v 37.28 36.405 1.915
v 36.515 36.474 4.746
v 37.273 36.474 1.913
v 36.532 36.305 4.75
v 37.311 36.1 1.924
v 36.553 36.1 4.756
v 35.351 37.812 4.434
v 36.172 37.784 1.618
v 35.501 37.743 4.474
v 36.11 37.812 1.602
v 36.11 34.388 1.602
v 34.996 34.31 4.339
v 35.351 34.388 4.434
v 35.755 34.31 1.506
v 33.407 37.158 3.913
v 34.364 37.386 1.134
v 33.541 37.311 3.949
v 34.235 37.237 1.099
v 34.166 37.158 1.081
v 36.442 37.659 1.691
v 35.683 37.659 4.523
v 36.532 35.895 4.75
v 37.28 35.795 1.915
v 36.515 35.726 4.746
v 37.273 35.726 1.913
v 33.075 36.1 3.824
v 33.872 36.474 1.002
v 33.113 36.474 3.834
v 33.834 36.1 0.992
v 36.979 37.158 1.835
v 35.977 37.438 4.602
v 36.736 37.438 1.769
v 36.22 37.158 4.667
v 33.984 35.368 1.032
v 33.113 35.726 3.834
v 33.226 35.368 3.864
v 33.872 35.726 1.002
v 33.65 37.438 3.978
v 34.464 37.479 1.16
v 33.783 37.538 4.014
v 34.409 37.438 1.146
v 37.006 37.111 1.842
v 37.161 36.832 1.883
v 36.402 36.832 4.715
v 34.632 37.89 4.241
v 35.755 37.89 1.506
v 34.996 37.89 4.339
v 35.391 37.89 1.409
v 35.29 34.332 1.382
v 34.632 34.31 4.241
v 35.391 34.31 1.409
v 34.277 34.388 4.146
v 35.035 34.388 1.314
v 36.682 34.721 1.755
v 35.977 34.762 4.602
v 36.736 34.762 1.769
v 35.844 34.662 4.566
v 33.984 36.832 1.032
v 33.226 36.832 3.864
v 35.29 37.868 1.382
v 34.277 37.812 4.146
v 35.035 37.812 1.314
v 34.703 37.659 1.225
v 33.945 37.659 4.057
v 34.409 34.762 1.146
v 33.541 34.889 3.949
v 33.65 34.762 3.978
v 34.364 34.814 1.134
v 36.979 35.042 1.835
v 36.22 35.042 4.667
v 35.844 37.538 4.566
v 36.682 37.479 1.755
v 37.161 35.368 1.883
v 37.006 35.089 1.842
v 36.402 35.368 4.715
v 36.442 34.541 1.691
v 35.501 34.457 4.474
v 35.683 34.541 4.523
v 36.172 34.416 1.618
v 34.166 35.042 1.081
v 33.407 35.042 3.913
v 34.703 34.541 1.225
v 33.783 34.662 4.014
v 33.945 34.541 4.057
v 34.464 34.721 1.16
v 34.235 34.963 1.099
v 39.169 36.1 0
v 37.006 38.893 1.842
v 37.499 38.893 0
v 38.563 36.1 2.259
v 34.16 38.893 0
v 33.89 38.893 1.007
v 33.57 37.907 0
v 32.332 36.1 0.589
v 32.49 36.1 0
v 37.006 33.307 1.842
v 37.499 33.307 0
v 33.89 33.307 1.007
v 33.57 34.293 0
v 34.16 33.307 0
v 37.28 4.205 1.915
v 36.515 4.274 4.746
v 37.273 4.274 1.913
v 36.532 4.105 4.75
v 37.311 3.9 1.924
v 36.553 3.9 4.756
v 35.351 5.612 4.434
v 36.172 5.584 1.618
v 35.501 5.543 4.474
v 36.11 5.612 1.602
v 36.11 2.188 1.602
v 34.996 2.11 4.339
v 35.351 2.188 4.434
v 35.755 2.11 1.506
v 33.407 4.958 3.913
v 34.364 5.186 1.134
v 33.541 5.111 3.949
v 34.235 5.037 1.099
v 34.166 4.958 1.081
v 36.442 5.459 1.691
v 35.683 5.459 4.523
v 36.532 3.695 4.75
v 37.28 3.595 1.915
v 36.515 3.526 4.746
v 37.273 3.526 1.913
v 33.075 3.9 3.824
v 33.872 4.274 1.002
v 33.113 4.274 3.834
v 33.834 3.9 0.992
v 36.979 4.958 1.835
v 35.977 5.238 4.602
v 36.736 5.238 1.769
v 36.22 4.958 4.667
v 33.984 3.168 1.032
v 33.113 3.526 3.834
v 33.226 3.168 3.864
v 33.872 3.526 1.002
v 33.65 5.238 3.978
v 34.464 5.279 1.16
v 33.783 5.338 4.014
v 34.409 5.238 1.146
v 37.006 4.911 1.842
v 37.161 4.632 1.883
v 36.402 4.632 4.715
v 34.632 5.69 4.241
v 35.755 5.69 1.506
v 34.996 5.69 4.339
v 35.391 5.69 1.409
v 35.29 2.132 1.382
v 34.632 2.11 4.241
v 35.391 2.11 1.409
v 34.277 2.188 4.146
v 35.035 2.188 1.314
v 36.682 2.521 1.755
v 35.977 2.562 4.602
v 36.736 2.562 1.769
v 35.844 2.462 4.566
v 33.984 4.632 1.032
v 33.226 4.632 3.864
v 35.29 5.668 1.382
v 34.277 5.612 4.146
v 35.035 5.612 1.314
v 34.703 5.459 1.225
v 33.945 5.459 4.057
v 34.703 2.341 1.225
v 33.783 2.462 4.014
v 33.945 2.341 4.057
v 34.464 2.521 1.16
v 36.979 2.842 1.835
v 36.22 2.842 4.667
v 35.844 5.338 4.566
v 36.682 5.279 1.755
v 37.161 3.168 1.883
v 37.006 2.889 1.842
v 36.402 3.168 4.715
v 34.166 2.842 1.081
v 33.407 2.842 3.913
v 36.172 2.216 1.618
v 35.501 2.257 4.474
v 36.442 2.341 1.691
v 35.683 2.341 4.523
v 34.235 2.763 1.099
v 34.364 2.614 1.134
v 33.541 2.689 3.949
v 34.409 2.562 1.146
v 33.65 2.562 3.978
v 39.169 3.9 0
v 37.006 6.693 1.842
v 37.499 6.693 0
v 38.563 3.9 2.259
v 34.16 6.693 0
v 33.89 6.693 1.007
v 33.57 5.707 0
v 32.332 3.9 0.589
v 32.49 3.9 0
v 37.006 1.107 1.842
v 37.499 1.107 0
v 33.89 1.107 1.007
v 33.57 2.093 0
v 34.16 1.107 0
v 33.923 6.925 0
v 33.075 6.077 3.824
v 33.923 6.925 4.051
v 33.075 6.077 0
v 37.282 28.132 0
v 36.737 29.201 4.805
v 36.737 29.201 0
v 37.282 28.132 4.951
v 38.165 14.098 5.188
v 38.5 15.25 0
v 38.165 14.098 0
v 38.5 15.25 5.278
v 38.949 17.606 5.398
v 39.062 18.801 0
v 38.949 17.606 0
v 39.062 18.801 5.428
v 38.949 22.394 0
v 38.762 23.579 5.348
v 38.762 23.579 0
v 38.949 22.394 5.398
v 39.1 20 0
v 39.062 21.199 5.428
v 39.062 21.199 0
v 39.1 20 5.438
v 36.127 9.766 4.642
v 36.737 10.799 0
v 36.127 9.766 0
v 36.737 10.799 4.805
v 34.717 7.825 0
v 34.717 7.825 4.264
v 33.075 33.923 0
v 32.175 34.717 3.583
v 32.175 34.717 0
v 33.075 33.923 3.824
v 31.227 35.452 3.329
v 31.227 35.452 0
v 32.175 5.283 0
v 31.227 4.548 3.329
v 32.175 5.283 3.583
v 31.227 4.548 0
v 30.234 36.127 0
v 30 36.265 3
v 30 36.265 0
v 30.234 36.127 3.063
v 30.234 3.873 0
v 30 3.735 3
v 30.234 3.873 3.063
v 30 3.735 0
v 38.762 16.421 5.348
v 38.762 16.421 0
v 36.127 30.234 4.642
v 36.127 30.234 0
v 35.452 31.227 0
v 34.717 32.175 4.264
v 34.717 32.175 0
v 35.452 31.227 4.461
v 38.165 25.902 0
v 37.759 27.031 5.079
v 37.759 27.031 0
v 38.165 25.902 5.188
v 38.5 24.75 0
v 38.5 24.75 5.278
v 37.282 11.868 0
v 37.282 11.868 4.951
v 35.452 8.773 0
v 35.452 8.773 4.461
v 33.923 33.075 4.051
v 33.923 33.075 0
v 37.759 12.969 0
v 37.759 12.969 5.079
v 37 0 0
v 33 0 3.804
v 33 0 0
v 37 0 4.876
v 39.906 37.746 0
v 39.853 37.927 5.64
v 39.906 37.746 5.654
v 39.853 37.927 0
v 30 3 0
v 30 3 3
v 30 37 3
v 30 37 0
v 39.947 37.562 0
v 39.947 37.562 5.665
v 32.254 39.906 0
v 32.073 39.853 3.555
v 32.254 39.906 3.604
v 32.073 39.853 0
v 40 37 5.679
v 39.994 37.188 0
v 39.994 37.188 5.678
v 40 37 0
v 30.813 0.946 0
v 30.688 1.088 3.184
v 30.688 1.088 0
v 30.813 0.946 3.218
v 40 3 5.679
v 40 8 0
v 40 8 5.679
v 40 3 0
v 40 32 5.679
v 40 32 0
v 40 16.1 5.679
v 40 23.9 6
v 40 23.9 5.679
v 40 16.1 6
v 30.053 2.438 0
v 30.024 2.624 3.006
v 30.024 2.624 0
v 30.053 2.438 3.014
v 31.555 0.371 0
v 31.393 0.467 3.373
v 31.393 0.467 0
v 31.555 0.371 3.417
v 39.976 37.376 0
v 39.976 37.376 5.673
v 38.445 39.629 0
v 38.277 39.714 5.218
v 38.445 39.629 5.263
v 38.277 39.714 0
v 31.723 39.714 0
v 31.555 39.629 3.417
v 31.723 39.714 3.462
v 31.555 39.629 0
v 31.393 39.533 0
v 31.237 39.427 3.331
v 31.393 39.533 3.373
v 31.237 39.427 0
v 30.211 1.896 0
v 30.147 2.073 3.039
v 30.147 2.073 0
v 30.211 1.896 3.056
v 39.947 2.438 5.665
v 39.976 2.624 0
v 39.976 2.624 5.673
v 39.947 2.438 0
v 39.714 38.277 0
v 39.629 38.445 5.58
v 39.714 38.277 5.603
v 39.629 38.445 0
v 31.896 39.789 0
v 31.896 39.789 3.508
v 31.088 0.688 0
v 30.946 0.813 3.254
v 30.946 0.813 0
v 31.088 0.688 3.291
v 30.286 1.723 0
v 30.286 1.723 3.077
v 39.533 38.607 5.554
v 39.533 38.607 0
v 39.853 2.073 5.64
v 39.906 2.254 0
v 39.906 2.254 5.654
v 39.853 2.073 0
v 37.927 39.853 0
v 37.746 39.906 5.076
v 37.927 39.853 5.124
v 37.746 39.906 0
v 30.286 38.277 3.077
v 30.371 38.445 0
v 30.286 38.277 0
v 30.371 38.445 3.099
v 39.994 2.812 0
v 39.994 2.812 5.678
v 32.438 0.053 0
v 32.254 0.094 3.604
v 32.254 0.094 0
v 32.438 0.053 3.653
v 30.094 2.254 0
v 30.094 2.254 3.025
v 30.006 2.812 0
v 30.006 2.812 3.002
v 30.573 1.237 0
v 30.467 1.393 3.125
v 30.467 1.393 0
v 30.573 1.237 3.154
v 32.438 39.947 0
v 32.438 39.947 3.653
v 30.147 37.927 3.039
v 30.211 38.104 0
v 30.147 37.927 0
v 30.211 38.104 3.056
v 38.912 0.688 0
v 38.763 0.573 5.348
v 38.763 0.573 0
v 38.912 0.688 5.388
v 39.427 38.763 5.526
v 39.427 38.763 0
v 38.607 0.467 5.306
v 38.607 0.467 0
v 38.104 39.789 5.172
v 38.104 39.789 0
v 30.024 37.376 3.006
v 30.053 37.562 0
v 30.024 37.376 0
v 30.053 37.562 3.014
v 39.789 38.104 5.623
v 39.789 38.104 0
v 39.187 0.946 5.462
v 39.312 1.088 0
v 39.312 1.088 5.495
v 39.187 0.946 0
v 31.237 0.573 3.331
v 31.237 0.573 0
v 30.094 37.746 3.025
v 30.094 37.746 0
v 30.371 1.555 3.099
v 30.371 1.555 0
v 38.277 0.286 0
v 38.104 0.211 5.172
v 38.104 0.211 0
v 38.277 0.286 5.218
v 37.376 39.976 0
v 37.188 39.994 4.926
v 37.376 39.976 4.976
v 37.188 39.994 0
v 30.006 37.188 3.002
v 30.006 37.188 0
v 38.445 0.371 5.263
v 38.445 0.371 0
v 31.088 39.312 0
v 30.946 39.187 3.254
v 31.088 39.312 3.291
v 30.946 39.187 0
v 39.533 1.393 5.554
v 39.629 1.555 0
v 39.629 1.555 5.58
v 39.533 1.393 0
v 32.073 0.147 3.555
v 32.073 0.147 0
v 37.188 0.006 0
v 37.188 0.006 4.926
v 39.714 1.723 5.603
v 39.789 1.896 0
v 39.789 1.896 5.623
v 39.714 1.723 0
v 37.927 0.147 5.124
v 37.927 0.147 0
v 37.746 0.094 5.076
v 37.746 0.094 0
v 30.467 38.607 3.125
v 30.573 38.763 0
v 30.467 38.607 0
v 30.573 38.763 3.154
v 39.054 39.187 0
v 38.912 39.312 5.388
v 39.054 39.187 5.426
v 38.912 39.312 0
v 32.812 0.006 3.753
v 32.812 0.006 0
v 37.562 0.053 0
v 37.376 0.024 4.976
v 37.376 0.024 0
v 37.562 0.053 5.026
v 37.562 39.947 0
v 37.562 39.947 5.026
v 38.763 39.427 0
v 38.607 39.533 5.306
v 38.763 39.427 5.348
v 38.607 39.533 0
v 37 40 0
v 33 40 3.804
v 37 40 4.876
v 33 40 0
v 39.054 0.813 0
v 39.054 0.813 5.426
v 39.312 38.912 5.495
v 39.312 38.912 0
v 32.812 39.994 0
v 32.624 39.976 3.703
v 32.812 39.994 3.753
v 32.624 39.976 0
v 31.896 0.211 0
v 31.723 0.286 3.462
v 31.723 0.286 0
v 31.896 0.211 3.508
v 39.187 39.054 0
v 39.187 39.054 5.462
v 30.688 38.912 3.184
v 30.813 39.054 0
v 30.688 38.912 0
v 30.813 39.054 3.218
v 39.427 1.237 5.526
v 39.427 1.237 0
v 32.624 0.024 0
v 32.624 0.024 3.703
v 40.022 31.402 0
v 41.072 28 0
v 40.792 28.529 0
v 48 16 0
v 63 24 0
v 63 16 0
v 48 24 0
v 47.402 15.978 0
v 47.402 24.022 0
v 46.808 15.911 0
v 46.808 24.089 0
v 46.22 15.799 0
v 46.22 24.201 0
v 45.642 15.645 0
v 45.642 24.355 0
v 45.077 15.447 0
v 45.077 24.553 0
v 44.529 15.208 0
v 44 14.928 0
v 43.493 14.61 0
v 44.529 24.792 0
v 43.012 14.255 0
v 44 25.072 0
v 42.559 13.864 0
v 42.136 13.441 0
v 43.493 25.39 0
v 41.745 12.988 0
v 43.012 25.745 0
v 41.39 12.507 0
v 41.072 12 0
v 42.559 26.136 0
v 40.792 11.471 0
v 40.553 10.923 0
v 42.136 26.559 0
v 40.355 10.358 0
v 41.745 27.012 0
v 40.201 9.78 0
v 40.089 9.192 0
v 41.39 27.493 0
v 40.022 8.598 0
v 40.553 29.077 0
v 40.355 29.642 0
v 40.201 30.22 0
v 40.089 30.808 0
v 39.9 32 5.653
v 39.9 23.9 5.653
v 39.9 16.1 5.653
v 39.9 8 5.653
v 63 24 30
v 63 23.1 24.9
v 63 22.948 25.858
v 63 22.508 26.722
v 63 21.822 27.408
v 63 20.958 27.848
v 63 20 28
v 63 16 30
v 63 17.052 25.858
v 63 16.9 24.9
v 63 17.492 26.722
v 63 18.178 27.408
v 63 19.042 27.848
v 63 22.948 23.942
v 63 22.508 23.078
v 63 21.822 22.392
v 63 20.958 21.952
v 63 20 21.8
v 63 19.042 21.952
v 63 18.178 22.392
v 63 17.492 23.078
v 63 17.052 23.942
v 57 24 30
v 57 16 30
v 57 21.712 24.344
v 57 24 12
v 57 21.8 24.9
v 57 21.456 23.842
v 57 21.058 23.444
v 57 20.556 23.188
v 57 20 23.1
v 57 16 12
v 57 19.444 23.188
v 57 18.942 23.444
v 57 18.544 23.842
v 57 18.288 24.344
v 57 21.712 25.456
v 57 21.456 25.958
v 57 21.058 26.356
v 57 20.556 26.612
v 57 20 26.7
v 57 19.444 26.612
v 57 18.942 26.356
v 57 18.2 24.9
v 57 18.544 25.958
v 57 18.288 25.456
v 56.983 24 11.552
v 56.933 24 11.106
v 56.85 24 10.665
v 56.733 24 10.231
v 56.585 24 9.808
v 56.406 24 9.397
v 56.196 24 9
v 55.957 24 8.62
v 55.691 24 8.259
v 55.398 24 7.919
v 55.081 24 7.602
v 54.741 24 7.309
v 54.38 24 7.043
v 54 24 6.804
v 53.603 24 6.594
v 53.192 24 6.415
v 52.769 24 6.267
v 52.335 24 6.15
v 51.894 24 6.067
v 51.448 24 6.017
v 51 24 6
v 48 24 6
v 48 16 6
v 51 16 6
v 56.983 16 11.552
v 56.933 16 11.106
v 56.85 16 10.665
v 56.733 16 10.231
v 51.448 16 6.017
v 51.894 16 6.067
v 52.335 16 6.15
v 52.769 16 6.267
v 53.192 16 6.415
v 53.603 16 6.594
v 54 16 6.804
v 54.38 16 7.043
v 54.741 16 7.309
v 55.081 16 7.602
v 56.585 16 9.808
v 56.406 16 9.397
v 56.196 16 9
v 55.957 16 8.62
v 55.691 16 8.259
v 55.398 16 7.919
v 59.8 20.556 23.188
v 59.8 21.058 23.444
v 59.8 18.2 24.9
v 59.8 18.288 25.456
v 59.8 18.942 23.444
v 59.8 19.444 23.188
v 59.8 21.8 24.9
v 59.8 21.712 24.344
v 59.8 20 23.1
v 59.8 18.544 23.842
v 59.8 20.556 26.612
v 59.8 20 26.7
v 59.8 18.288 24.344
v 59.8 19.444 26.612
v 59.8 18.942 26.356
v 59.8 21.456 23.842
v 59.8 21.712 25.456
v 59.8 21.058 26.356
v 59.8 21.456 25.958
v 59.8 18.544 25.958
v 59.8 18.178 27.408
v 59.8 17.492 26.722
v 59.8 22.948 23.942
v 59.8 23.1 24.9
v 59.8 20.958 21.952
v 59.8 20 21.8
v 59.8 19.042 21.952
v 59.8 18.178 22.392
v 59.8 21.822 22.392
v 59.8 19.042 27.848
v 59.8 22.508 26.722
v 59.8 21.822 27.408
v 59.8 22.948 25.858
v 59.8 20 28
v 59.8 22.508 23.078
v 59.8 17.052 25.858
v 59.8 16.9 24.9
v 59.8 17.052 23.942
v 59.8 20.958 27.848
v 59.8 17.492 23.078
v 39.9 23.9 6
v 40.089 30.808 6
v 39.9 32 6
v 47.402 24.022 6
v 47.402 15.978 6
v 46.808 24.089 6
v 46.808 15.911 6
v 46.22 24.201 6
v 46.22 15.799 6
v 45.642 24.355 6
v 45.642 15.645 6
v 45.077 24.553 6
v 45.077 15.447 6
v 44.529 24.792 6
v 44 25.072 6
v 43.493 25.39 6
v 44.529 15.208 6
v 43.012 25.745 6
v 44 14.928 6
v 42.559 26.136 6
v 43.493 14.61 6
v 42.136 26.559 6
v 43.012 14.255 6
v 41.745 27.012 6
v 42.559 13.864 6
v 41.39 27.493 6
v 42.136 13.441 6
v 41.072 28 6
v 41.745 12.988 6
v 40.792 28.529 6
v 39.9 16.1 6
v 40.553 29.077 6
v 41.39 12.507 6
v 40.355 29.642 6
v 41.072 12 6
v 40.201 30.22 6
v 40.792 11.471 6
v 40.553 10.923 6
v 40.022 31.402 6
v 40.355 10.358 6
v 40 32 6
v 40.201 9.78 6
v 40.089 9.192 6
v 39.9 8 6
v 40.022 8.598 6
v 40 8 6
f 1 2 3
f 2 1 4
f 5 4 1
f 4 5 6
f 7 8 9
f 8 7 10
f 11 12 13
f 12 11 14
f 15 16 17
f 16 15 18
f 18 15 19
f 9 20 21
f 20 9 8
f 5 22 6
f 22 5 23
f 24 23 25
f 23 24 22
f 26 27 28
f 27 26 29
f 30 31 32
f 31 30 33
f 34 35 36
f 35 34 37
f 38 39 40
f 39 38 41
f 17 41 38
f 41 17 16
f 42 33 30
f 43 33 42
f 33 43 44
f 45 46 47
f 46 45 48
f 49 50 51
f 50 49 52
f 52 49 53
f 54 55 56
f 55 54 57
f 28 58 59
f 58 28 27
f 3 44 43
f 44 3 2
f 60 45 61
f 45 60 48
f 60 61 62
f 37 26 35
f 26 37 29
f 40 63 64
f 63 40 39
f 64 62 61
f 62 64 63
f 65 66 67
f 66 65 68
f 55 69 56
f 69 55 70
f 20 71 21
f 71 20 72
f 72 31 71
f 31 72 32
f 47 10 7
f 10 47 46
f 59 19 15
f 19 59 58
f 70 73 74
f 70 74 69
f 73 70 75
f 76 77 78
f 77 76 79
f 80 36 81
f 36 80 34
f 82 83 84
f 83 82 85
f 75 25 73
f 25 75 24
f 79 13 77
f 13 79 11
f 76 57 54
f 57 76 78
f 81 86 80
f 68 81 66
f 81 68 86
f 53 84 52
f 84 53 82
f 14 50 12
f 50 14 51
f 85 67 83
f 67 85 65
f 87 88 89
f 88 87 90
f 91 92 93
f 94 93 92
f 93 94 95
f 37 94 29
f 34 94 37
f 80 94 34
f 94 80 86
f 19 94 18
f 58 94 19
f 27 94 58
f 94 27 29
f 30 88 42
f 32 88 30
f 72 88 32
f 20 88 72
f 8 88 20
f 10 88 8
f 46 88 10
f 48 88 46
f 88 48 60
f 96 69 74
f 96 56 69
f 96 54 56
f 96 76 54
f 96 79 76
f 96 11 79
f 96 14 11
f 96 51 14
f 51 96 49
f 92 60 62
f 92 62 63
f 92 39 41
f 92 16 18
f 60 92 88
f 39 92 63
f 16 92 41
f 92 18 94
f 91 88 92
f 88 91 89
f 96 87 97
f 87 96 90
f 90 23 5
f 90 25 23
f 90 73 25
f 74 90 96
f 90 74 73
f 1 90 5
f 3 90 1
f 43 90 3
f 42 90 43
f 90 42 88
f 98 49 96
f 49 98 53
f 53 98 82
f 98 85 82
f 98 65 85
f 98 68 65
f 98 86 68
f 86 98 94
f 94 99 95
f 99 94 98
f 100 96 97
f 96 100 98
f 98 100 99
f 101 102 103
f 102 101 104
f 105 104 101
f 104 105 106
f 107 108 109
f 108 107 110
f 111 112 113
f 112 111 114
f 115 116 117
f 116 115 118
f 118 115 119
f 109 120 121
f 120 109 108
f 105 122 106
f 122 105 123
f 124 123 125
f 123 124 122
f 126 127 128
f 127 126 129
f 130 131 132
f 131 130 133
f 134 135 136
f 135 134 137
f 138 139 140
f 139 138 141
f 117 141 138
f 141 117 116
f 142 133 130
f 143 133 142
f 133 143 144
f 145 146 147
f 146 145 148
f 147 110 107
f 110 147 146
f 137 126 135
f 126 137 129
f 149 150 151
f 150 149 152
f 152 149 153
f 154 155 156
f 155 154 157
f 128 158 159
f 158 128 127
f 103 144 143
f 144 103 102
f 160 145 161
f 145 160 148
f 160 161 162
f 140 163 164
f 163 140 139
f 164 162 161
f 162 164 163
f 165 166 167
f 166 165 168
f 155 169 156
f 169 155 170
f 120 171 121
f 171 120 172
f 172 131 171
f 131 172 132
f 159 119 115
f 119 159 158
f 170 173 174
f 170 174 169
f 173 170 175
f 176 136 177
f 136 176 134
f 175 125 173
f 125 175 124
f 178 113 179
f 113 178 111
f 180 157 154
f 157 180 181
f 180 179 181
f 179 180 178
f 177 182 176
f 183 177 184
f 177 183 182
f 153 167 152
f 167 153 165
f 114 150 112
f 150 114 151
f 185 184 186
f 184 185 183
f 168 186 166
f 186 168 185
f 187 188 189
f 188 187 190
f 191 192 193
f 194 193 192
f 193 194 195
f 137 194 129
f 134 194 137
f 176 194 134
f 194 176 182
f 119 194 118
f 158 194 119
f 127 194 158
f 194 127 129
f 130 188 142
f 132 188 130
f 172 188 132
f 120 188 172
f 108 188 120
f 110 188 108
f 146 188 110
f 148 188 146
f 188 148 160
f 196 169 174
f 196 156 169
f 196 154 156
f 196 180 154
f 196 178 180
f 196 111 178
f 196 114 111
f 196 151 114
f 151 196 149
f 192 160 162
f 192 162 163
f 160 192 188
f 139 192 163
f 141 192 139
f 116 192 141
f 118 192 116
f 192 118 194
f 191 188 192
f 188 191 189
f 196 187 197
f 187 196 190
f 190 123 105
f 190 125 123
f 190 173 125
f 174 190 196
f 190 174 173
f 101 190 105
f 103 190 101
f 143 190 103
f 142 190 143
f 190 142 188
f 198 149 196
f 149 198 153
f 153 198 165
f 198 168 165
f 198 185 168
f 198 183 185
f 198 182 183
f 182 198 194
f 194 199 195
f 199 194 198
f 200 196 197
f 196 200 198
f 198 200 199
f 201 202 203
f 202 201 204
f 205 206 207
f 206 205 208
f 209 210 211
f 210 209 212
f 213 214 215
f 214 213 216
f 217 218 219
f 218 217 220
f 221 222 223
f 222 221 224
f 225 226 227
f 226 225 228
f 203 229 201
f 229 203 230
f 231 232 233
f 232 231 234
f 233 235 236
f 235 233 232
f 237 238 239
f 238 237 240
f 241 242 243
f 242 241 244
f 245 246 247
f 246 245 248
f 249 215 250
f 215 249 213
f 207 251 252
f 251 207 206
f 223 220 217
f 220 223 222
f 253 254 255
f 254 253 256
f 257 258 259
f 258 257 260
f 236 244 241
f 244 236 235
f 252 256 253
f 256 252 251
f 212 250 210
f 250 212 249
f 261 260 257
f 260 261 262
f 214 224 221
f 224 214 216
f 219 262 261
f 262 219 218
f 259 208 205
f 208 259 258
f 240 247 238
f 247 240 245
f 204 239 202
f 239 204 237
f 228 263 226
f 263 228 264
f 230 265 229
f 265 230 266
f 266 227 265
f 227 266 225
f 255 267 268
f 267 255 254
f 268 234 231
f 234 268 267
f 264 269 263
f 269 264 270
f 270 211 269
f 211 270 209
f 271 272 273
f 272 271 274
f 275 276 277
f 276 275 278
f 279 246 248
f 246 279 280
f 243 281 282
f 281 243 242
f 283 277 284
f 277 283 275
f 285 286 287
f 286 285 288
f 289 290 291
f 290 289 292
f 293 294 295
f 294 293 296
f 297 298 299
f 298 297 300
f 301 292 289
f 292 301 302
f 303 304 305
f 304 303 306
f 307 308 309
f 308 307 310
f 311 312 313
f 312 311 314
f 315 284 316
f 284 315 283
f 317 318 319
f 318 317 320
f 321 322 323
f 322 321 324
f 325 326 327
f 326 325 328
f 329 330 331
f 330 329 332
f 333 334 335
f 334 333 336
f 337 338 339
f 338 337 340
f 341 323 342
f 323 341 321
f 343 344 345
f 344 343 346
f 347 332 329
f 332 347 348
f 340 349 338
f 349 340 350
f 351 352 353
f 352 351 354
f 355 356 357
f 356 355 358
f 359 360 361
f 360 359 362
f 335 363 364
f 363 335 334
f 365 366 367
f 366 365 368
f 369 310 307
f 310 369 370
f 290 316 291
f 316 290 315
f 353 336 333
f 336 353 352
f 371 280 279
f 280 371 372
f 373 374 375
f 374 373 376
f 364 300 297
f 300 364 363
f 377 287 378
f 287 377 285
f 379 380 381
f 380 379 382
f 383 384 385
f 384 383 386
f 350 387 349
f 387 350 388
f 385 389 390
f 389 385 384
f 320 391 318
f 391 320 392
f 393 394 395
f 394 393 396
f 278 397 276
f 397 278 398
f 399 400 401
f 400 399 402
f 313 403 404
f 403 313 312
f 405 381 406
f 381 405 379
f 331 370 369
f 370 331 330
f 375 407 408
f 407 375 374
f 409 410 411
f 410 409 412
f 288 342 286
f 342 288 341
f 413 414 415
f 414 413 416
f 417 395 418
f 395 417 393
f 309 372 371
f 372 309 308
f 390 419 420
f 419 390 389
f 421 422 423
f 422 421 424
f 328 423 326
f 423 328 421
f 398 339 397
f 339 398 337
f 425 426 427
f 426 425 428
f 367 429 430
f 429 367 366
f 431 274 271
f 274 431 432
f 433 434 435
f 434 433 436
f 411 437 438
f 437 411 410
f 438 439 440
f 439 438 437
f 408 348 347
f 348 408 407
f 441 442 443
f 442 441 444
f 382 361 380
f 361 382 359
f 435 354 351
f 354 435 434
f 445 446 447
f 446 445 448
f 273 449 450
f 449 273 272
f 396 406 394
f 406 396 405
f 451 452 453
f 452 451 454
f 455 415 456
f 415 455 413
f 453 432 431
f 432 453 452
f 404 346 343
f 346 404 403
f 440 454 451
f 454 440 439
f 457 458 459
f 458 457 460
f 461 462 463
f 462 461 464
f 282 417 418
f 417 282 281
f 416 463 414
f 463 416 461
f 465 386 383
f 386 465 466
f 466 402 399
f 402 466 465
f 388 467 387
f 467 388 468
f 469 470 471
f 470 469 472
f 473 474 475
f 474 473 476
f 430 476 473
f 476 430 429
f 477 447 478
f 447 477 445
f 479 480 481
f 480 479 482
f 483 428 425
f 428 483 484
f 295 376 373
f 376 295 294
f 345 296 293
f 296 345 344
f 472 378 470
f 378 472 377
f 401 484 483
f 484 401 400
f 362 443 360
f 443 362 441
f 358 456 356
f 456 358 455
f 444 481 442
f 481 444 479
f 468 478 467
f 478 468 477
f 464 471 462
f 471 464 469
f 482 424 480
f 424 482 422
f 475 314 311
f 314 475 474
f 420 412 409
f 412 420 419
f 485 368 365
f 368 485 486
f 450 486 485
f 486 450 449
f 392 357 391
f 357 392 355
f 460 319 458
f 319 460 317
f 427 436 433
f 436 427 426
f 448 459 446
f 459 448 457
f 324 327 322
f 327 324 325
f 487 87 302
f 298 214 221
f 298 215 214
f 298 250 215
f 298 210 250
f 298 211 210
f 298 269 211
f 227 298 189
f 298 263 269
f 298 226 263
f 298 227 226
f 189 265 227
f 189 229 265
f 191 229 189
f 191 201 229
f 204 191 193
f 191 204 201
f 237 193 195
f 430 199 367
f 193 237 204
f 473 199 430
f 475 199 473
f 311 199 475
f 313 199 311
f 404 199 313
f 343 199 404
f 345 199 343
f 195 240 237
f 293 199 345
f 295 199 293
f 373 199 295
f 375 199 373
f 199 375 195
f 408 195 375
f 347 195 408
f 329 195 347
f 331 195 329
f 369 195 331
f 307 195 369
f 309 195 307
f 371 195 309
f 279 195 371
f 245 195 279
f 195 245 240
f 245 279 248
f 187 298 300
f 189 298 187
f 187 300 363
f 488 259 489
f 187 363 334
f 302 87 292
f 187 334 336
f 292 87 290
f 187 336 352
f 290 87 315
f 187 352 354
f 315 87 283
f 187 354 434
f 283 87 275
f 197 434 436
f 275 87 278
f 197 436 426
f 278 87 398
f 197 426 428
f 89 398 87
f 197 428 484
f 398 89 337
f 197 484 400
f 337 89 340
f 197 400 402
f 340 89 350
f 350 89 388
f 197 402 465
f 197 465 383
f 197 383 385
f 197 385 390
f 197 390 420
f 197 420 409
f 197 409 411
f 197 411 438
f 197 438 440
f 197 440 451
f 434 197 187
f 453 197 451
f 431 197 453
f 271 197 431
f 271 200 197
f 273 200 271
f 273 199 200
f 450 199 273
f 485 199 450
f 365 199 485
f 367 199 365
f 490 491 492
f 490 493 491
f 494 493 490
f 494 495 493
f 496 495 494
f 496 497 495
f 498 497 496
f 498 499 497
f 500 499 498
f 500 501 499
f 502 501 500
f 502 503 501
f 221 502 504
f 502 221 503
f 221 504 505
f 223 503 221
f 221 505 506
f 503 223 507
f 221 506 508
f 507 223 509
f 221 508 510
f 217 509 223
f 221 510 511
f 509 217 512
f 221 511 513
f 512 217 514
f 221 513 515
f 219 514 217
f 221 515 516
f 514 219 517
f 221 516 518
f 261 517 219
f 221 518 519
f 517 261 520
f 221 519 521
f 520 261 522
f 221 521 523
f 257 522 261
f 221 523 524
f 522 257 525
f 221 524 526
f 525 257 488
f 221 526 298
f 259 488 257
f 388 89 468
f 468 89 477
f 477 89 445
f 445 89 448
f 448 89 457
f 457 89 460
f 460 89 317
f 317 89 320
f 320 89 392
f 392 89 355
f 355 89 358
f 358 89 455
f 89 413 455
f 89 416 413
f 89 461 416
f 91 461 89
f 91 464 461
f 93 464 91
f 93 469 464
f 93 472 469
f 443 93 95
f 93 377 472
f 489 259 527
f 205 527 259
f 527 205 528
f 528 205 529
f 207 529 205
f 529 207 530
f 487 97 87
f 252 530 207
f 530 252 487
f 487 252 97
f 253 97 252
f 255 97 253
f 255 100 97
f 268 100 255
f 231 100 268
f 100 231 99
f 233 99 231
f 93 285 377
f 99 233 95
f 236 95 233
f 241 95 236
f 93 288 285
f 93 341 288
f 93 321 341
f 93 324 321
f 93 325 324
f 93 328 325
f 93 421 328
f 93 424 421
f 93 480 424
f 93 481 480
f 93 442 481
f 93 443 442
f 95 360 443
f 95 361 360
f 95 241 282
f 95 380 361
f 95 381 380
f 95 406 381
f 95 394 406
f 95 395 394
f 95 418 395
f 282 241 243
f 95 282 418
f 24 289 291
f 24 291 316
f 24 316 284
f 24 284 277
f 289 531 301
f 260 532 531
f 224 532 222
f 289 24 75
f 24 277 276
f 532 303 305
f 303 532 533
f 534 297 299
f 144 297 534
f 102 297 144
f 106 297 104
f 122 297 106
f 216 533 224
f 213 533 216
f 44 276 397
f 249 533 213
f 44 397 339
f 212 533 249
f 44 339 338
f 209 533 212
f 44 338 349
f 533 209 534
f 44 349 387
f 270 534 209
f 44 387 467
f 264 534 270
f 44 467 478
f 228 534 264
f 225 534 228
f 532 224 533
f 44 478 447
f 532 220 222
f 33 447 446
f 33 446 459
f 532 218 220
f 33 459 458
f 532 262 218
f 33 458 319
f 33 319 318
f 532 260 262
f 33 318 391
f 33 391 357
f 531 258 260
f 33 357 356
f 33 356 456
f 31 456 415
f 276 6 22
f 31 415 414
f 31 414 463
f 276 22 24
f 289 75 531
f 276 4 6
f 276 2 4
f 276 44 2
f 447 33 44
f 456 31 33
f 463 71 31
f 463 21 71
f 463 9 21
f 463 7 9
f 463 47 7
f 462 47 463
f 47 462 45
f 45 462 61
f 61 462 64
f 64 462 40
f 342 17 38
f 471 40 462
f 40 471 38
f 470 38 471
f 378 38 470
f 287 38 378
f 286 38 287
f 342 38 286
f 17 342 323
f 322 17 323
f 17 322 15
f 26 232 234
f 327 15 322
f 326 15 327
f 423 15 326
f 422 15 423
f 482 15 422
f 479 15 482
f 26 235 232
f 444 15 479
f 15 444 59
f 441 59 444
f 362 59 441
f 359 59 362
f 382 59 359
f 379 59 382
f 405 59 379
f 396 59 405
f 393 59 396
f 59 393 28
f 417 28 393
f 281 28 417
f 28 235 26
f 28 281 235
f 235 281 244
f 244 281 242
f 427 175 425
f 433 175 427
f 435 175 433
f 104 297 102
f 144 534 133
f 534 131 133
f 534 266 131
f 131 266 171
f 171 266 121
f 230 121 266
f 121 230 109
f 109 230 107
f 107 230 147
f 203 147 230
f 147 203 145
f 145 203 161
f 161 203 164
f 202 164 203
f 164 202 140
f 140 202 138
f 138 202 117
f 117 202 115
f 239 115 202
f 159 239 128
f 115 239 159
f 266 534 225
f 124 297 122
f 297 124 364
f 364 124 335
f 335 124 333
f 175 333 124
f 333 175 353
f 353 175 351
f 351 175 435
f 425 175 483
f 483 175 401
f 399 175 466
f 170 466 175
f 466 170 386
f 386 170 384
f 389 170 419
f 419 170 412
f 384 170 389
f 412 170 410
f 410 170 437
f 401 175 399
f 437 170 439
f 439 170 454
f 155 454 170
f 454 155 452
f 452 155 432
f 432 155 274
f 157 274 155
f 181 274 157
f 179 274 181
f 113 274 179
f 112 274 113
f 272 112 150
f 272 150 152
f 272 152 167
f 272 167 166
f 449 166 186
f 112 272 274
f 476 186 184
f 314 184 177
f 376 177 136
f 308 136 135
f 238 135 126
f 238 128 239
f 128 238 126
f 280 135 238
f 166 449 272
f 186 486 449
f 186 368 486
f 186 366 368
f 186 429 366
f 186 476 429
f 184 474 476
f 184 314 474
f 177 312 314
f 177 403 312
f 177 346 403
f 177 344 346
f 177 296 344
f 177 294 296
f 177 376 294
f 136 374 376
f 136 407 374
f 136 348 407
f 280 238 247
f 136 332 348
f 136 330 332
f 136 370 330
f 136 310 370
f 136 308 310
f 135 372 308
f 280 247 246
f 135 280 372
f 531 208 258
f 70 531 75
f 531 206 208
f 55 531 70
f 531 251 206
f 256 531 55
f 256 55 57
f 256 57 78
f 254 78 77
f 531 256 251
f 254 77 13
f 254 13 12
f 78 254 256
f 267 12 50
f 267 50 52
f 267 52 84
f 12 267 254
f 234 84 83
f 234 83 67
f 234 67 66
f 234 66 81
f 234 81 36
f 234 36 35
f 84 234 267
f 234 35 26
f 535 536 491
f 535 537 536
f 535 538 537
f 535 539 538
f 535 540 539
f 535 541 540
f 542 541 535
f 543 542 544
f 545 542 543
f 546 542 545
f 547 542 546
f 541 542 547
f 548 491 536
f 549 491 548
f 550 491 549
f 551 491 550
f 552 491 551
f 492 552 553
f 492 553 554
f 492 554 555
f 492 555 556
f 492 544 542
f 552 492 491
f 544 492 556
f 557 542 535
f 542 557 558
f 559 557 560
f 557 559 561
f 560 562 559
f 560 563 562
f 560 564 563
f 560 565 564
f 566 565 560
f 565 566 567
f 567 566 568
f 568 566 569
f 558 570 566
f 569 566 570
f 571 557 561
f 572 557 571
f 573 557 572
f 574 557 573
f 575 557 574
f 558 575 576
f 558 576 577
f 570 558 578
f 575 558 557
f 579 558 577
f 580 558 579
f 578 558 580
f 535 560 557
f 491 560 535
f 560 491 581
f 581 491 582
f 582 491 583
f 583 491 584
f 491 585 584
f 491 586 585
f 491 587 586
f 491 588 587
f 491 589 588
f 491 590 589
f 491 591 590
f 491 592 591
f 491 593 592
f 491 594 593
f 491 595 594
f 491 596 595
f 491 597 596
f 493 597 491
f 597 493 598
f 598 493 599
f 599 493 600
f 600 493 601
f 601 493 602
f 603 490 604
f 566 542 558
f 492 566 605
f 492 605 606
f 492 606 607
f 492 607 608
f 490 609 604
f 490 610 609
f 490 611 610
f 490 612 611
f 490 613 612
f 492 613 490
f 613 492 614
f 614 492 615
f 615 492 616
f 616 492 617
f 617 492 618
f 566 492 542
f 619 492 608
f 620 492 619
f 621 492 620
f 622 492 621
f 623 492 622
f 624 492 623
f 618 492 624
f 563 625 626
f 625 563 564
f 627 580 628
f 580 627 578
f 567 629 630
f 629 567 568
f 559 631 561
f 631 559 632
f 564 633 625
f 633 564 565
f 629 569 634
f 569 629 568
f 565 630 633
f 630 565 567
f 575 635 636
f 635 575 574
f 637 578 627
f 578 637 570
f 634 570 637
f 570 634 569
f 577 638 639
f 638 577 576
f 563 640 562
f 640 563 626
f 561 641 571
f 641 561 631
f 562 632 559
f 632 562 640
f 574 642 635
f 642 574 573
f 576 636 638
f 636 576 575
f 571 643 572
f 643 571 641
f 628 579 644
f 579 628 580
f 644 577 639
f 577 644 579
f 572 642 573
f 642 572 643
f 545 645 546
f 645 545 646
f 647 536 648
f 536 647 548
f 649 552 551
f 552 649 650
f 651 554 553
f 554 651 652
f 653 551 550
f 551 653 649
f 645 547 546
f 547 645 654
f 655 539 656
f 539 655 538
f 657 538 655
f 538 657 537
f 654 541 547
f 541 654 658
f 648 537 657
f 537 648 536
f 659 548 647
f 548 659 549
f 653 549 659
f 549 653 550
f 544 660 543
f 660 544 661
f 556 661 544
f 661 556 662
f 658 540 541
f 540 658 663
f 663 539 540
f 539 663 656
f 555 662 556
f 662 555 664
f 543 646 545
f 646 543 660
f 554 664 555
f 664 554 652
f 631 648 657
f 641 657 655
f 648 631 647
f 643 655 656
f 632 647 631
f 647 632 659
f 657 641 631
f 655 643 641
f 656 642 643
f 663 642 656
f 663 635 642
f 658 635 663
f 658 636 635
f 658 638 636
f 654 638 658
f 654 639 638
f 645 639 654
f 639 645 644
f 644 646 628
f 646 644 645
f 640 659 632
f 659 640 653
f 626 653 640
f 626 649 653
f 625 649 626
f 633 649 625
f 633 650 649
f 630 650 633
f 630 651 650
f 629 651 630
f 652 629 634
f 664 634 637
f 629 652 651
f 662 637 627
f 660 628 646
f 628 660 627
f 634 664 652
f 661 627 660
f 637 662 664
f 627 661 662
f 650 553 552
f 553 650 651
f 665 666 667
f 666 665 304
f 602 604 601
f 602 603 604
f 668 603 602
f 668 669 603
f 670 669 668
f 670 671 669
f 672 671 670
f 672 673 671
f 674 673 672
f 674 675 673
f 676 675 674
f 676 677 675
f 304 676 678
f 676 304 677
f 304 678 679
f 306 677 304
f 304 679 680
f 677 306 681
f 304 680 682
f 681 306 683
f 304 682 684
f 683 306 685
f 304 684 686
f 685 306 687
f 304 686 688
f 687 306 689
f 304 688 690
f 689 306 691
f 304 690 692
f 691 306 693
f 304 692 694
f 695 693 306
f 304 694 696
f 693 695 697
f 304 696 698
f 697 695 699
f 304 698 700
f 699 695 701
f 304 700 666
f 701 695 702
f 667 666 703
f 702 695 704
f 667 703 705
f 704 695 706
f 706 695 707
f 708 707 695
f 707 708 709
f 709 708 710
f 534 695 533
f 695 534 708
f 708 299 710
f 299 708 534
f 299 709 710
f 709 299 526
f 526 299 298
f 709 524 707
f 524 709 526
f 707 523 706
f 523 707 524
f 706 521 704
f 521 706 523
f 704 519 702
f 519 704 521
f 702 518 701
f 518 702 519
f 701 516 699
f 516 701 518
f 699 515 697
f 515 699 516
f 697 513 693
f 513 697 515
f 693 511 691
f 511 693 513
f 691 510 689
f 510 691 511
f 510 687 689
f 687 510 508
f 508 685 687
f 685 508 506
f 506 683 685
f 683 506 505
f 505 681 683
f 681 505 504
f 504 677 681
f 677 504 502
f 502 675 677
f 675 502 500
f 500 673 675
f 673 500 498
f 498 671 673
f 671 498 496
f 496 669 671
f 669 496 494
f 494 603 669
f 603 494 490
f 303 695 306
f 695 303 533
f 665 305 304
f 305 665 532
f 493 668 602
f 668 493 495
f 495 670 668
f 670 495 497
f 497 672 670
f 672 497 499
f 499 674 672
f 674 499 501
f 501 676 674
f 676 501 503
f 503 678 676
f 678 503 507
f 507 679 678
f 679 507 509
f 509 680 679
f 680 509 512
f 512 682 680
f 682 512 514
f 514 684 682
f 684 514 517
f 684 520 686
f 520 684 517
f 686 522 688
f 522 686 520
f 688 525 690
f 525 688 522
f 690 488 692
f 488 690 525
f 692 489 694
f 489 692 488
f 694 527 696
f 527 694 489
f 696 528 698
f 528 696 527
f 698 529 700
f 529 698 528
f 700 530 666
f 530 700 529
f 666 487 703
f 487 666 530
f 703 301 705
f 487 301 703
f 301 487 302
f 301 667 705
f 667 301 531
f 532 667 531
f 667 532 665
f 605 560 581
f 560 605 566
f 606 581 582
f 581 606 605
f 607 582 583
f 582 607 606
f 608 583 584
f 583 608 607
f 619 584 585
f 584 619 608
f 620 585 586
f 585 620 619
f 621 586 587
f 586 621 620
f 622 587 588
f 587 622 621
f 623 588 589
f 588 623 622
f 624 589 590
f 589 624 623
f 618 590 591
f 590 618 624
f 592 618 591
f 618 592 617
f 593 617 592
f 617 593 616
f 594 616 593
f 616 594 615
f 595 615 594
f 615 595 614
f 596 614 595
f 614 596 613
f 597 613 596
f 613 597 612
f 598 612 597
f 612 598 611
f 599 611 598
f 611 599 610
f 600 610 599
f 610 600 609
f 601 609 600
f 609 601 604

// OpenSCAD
// file: chamfers.scad
/* chamfers for openscad
 *
 *
 * (c) alj_rprp 2013 license GPL2.1
 */

// interface :
// chamfer				(len,r,rs)           : rounding of edge along z
// cylinder_chamfer	(majr,r,rs)				: circular rounding 
// rnd_wedge 			(len,lr,angle,r,rs)  : wedge with 1 rounded angle
// circular_rnd_wedge(majr,lr,angle,r,rs) : circular wedge/ 1 rounded angle

// len	: length of extrusion
// r		: rounding radius
// majr	: major radius of circular extrusion
// lr		: dist from left side of rounding center
// angle	: angle of wedge
// rs		: resolution - number of lines in the rounding
//
// use rs =0 for straight line chamfer in both chamfers
// wedges will look funny with rs < 5 or 6


$fn=64; 

//example=true;
example=false;

if(example==true) {
	chamfer(1,1,rs=8);
	translate([0,0,-1.5]) cylinder_chamfer(2.4,1,rs=2);
	translate([4,0,0]) rnd_wedge (1,1,30.0,0.3,rs=10);
	translate([4,0,-1.5]) 
		circular_rnd_wedge (0.5,0.5,30.0,0.3,rs=10);
}


module cylinder_chamfer(majr,r,rs=4)
{
	t=majr-r;
	p=r+0.1;
	rotate_extrude()	difference(){
		translate([t,0])square([p,p]);
		translate([t,0])circle(r,$fn=(rs+1)*4);
	}
}

module chamfer(len,r,rs=4)
{
	p=r+0.1;
	linear_extrude(height=len) difference()
	{
		square([p,p]);
		circle(r,$fn=(rs+1)*4);
	}
}

/*
 * lr = position centre rayon
 *	x1 = x component hypothenuse normal
 * x2 = x component up to point
 *
 * x1 = rr*sin(a)
 * x2 = y2/tan(a)
 *	y2 = rr*cos(a)+rr  
 *
 * base = lr + x1 + x2
 * base = lr + rr*( sin(a)+(cos(a)+1)/tan(a) 
*/
module rnd_wedge (len,lr,angle,r,rs=6) {
	rr=r*(sin(angle)+(cos(angle)+1)/tan(angle));
	ratio=(lr+rr)/lr;
	base=lr*ratio;
	b=base*tan(angle);
	h=base/cos(angle);

	linear_extrude(height=len)union(){
		polygon([[0,0],[lr,0],[lr+r*sin(angle),r*(1+cos(angle))],[0,b]]);
		translate([lr,r])intersection() {
			circle(r,$fn=(rs+1)*4);
			translate([0,-r-0.05])square([r+0.1,2*r+0.1]);
		}
	}
}

module circular_rnd_wedge (majr,lr,angle,r,rs=6) {
	rr=r*(sin(angle)+(cos(angle)+1)/tan(angle));
	ratio=(lr+rr)/lr;
	base=lr*ratio;
	b=base*tan(angle);
	h=base/cos(angle);

	rotate_extrude()translate([majr,0]) union(){
		polygon([[0,0],[lr,0],[lr+r*sin(angle),r*(1+cos(angle))],[0,b]]);
		translate([lr,r])intersection() {
			circle(r,$fn=(rs+1)*4);
			translate([0,-r-0.05])square([r+0.1,2*r+0.1]);
		}
	}
}
// main file
// New part cooling fan mount, used in E3D Lite update of Deltatron

use <chamfers.scad>;

fan_dimension = 40; // for 40x40 mm fan
fan_height = 7; // most common, can be 7 or 12 mm
fan_mount_hole_dia = 3.6; // diameter of corner mount holes
fan_mount_hole_offset = 3.9; // distance from center of mounthole to fan edge
fan_diameter = 38.2; 

rounding_radius = 3; // corner rounding radius
base_mount_height = 10; // fan mount base height
base_chamber_height = base_mount_height - 2; 

fan_duct_wall = 1;
fan_duct_width = fan_dimension/3;
fan_duct_height = base_chamber_height/2;

arm_width = 8;
arm_length = 30; // how long is horizontal part of arm (when mounted) WAS 33
arm_height = 17; // how long is vertical part of arm (when mounted)
arm_thickness = 6;
arm_mount_hole_dia = 6.2; // M3 bolt head diameter
arm_mount_hole_height = 3.2; // M3 bolt hole height

dr = sqrt(2*pow(fan_dimension/2, 2)) -sqrt(2*pow(fan_mount_hole_offset, 2)); // delta radius for corner mounting holes
ex = 0.01; // auxiliary variable

part_cooling_fan_mount();
translate([0, 0, base_mount_height]) %fan();

module part_cooling_fan_mount(){
    //rotate([180,0,0]) translate([0, -fan_dimension, -base_mount_height])
    //difference(){
//        base_mount();
//        translate([-ex, fan_dimension/2, 0]) cube([15, fan_dimension/2, base_mount_height], center=true);
//    }
    //fan_duct();
    base_mount2();
    translate([fan_dimension, fan_dimension/2 - arm_width/2, 0]) arm();
}

module base_mount(){
     difference(){
        rounded_rect(fan_dimension, fan_dimension, base_mount_height, rounding_radius);
        // centered parts
        translate([fan_dimension/2, fan_dimension/2, -ex]){
            for (i = [45 : 90 : 315]) {
                translate([dr*sin(i), dr*cos(i), 0]){
                    // add M3 mount hole
                    cylinder(d = fan_mount_hole_dia, h = base_mount_height + 2*ex, $fn=30);
                    // add M3 nut trap
                    translate([0, 0, base_mount_height - 2])
                        cylinder(r=5.5 / 2 / cos(180 / 6) + 0.05, h=2 + 2*ex, $fn=6);
                }
            }
            cylinder(d = fan_diameter, h = base_chamber_height, $fn = 100);
        } // end of centered parts
        
     } //difference
     translate([fan_dimension/2, fan_dimension/2, -ex])
        cylinder_chamfer(fan_diameter/2,base_chamber_height,rs=20);
}

module base_mount2(){
    rot_ang=-15; //rotation angle of fan
    difference(){
        translate([fan_dimension*3/4,0,0]) 
            rounded_rect(fan_dimension/4, fan_dimension, arm_thickness, rounding_radius);
        translate([fan_dimension/2, fan_dimension/2, -ex]){
            for (i = [45 : 90 : 315]) {
                translate([dr*sin(i), dr*cos(i), -0.5]){
                    // add M3 mount hole
                    rotate([0,rot_ang,0])
                    cylinder(d = fan_mount_hole_dia, h = base_mount_height + 1, $fn=30);
                    // add M3 nut trap
                    translate([0,0,-0.5])
                        rotate([0,rot_ang,0])
                        cylinder(r=5.5 / 2 / cos(180 / 6) + 0.05, h=2.5 + 2*ex, $fn=6);
                }
            }
            cylinder(d = fan_diameter, h = base_chamber_height, $fn = 100);
        }
        translate([fan_dimension*3/4,0,arm_thickness-3])
            rotate([0,rot_ang,0])
            cube([fan_dimension/4+1, fan_dimension, arm_thickness]);
    }//difference
}

module fan_duct(){
    add = 3.5; //added vertical dimension
    translate([-10-add, fan_dimension/4, 0])
        cube([10+add, fan_dimension/2, base_mount_height/2]);
    translate([-5-add, 3/4*fan_dimension, base_mount_height]) rotate([90, 180, 0])   
        chamfer(fan_dimension/2, base_mount_height/2,rs=10);
    translate([-10-add, fan_dimension/4 - 1, 0]) cube([10+add, 1, base_mount_height+fan_height/2]);
    translate([-10-add, 3*fan_dimension/4, 0]) cube([10+add, 1, base_mount_height+fan_height/2]);
    translate([-11-add, fan_dimension/4 - 1, 0]) cube([1, fan_dimension/2 + 2, base_mount_height+fan_height/2]);
    translate([-5-add, fan_dimension/4-1, base_mount_height+fan_height/2-1])
        cube([5+add, fan_dimension/2+2, 1]);
}

module fan(){
    difference(){
        rounded_rect(fan_dimension, fan_dimension, fan_height, rounding_radius);
        translate([fan_dimension/2, fan_dimension/2, -ex]){
            cylinder(d = fan_diameter, h = fan_height + 2*ex, $fn=60);
               for (i = [45 : 90 : 315]) {
                translate([dr*sin(i), dr*cos(i), 0])
                    cylinder(d = fan_mount_hole_dia, h = fan_height + 2*ex, $fn=30);
                   }
        }
    }
}

module arm(){
    // vertical part of arm
    cube([arm_height, arm_width, arm_thickness]); 
    rotate([0, 0, 90]) translate([-arm_width, -arm_width, 0])
        chamfer(arm_thickness, arm_width, rs=20);
    rotate([0, 0, 180]) translate([-arm_width, -2*arm_width, 0])
        chamfer(arm_thickness, arm_width, rs=20);
    // horizontal part of arm
    translate([arm_height, 0, 0]) difference(){
        cube([arm_thickness, arm_width, arm_length]);
        translate([-ex, arm_width/2, arm_length - arm_mount_hole_dia/2 - 2])
            rotate([0, 90, 0]) cylinder(d=fan_mount_hole_dia, h=arm_thickness + 2*ex, $fn=20);
        translate([arm_thickness - arm_mount_hole_height, arm_width/2, arm_length - arm_mount_hole_dia/2 - 2])
            rotate([0, 90, 0]) cylinder(d=arm_mount_hole_dia, h=arm_mount_hole_height + ex, $fn=20);
    }
    translate([arm_height - arm_thickness, arm_width, 2*arm_thickness]) rotate([90, 90, 0])
        chamfer(arm_width, arm_thickness, rs=20);
}

//UTILITY

//draws a rounded rectangle
module rounded_rect(x, y, z, radius) {
    translate([radius,radius,0]) //move origin to outer limits
	linear_extrude(height=z)
		minkowski() {
			square([x-2*radius,y-2*radius]); //keep outer dimensions given by x and y
			circle(r = radius, $fn=100);
		}
}
